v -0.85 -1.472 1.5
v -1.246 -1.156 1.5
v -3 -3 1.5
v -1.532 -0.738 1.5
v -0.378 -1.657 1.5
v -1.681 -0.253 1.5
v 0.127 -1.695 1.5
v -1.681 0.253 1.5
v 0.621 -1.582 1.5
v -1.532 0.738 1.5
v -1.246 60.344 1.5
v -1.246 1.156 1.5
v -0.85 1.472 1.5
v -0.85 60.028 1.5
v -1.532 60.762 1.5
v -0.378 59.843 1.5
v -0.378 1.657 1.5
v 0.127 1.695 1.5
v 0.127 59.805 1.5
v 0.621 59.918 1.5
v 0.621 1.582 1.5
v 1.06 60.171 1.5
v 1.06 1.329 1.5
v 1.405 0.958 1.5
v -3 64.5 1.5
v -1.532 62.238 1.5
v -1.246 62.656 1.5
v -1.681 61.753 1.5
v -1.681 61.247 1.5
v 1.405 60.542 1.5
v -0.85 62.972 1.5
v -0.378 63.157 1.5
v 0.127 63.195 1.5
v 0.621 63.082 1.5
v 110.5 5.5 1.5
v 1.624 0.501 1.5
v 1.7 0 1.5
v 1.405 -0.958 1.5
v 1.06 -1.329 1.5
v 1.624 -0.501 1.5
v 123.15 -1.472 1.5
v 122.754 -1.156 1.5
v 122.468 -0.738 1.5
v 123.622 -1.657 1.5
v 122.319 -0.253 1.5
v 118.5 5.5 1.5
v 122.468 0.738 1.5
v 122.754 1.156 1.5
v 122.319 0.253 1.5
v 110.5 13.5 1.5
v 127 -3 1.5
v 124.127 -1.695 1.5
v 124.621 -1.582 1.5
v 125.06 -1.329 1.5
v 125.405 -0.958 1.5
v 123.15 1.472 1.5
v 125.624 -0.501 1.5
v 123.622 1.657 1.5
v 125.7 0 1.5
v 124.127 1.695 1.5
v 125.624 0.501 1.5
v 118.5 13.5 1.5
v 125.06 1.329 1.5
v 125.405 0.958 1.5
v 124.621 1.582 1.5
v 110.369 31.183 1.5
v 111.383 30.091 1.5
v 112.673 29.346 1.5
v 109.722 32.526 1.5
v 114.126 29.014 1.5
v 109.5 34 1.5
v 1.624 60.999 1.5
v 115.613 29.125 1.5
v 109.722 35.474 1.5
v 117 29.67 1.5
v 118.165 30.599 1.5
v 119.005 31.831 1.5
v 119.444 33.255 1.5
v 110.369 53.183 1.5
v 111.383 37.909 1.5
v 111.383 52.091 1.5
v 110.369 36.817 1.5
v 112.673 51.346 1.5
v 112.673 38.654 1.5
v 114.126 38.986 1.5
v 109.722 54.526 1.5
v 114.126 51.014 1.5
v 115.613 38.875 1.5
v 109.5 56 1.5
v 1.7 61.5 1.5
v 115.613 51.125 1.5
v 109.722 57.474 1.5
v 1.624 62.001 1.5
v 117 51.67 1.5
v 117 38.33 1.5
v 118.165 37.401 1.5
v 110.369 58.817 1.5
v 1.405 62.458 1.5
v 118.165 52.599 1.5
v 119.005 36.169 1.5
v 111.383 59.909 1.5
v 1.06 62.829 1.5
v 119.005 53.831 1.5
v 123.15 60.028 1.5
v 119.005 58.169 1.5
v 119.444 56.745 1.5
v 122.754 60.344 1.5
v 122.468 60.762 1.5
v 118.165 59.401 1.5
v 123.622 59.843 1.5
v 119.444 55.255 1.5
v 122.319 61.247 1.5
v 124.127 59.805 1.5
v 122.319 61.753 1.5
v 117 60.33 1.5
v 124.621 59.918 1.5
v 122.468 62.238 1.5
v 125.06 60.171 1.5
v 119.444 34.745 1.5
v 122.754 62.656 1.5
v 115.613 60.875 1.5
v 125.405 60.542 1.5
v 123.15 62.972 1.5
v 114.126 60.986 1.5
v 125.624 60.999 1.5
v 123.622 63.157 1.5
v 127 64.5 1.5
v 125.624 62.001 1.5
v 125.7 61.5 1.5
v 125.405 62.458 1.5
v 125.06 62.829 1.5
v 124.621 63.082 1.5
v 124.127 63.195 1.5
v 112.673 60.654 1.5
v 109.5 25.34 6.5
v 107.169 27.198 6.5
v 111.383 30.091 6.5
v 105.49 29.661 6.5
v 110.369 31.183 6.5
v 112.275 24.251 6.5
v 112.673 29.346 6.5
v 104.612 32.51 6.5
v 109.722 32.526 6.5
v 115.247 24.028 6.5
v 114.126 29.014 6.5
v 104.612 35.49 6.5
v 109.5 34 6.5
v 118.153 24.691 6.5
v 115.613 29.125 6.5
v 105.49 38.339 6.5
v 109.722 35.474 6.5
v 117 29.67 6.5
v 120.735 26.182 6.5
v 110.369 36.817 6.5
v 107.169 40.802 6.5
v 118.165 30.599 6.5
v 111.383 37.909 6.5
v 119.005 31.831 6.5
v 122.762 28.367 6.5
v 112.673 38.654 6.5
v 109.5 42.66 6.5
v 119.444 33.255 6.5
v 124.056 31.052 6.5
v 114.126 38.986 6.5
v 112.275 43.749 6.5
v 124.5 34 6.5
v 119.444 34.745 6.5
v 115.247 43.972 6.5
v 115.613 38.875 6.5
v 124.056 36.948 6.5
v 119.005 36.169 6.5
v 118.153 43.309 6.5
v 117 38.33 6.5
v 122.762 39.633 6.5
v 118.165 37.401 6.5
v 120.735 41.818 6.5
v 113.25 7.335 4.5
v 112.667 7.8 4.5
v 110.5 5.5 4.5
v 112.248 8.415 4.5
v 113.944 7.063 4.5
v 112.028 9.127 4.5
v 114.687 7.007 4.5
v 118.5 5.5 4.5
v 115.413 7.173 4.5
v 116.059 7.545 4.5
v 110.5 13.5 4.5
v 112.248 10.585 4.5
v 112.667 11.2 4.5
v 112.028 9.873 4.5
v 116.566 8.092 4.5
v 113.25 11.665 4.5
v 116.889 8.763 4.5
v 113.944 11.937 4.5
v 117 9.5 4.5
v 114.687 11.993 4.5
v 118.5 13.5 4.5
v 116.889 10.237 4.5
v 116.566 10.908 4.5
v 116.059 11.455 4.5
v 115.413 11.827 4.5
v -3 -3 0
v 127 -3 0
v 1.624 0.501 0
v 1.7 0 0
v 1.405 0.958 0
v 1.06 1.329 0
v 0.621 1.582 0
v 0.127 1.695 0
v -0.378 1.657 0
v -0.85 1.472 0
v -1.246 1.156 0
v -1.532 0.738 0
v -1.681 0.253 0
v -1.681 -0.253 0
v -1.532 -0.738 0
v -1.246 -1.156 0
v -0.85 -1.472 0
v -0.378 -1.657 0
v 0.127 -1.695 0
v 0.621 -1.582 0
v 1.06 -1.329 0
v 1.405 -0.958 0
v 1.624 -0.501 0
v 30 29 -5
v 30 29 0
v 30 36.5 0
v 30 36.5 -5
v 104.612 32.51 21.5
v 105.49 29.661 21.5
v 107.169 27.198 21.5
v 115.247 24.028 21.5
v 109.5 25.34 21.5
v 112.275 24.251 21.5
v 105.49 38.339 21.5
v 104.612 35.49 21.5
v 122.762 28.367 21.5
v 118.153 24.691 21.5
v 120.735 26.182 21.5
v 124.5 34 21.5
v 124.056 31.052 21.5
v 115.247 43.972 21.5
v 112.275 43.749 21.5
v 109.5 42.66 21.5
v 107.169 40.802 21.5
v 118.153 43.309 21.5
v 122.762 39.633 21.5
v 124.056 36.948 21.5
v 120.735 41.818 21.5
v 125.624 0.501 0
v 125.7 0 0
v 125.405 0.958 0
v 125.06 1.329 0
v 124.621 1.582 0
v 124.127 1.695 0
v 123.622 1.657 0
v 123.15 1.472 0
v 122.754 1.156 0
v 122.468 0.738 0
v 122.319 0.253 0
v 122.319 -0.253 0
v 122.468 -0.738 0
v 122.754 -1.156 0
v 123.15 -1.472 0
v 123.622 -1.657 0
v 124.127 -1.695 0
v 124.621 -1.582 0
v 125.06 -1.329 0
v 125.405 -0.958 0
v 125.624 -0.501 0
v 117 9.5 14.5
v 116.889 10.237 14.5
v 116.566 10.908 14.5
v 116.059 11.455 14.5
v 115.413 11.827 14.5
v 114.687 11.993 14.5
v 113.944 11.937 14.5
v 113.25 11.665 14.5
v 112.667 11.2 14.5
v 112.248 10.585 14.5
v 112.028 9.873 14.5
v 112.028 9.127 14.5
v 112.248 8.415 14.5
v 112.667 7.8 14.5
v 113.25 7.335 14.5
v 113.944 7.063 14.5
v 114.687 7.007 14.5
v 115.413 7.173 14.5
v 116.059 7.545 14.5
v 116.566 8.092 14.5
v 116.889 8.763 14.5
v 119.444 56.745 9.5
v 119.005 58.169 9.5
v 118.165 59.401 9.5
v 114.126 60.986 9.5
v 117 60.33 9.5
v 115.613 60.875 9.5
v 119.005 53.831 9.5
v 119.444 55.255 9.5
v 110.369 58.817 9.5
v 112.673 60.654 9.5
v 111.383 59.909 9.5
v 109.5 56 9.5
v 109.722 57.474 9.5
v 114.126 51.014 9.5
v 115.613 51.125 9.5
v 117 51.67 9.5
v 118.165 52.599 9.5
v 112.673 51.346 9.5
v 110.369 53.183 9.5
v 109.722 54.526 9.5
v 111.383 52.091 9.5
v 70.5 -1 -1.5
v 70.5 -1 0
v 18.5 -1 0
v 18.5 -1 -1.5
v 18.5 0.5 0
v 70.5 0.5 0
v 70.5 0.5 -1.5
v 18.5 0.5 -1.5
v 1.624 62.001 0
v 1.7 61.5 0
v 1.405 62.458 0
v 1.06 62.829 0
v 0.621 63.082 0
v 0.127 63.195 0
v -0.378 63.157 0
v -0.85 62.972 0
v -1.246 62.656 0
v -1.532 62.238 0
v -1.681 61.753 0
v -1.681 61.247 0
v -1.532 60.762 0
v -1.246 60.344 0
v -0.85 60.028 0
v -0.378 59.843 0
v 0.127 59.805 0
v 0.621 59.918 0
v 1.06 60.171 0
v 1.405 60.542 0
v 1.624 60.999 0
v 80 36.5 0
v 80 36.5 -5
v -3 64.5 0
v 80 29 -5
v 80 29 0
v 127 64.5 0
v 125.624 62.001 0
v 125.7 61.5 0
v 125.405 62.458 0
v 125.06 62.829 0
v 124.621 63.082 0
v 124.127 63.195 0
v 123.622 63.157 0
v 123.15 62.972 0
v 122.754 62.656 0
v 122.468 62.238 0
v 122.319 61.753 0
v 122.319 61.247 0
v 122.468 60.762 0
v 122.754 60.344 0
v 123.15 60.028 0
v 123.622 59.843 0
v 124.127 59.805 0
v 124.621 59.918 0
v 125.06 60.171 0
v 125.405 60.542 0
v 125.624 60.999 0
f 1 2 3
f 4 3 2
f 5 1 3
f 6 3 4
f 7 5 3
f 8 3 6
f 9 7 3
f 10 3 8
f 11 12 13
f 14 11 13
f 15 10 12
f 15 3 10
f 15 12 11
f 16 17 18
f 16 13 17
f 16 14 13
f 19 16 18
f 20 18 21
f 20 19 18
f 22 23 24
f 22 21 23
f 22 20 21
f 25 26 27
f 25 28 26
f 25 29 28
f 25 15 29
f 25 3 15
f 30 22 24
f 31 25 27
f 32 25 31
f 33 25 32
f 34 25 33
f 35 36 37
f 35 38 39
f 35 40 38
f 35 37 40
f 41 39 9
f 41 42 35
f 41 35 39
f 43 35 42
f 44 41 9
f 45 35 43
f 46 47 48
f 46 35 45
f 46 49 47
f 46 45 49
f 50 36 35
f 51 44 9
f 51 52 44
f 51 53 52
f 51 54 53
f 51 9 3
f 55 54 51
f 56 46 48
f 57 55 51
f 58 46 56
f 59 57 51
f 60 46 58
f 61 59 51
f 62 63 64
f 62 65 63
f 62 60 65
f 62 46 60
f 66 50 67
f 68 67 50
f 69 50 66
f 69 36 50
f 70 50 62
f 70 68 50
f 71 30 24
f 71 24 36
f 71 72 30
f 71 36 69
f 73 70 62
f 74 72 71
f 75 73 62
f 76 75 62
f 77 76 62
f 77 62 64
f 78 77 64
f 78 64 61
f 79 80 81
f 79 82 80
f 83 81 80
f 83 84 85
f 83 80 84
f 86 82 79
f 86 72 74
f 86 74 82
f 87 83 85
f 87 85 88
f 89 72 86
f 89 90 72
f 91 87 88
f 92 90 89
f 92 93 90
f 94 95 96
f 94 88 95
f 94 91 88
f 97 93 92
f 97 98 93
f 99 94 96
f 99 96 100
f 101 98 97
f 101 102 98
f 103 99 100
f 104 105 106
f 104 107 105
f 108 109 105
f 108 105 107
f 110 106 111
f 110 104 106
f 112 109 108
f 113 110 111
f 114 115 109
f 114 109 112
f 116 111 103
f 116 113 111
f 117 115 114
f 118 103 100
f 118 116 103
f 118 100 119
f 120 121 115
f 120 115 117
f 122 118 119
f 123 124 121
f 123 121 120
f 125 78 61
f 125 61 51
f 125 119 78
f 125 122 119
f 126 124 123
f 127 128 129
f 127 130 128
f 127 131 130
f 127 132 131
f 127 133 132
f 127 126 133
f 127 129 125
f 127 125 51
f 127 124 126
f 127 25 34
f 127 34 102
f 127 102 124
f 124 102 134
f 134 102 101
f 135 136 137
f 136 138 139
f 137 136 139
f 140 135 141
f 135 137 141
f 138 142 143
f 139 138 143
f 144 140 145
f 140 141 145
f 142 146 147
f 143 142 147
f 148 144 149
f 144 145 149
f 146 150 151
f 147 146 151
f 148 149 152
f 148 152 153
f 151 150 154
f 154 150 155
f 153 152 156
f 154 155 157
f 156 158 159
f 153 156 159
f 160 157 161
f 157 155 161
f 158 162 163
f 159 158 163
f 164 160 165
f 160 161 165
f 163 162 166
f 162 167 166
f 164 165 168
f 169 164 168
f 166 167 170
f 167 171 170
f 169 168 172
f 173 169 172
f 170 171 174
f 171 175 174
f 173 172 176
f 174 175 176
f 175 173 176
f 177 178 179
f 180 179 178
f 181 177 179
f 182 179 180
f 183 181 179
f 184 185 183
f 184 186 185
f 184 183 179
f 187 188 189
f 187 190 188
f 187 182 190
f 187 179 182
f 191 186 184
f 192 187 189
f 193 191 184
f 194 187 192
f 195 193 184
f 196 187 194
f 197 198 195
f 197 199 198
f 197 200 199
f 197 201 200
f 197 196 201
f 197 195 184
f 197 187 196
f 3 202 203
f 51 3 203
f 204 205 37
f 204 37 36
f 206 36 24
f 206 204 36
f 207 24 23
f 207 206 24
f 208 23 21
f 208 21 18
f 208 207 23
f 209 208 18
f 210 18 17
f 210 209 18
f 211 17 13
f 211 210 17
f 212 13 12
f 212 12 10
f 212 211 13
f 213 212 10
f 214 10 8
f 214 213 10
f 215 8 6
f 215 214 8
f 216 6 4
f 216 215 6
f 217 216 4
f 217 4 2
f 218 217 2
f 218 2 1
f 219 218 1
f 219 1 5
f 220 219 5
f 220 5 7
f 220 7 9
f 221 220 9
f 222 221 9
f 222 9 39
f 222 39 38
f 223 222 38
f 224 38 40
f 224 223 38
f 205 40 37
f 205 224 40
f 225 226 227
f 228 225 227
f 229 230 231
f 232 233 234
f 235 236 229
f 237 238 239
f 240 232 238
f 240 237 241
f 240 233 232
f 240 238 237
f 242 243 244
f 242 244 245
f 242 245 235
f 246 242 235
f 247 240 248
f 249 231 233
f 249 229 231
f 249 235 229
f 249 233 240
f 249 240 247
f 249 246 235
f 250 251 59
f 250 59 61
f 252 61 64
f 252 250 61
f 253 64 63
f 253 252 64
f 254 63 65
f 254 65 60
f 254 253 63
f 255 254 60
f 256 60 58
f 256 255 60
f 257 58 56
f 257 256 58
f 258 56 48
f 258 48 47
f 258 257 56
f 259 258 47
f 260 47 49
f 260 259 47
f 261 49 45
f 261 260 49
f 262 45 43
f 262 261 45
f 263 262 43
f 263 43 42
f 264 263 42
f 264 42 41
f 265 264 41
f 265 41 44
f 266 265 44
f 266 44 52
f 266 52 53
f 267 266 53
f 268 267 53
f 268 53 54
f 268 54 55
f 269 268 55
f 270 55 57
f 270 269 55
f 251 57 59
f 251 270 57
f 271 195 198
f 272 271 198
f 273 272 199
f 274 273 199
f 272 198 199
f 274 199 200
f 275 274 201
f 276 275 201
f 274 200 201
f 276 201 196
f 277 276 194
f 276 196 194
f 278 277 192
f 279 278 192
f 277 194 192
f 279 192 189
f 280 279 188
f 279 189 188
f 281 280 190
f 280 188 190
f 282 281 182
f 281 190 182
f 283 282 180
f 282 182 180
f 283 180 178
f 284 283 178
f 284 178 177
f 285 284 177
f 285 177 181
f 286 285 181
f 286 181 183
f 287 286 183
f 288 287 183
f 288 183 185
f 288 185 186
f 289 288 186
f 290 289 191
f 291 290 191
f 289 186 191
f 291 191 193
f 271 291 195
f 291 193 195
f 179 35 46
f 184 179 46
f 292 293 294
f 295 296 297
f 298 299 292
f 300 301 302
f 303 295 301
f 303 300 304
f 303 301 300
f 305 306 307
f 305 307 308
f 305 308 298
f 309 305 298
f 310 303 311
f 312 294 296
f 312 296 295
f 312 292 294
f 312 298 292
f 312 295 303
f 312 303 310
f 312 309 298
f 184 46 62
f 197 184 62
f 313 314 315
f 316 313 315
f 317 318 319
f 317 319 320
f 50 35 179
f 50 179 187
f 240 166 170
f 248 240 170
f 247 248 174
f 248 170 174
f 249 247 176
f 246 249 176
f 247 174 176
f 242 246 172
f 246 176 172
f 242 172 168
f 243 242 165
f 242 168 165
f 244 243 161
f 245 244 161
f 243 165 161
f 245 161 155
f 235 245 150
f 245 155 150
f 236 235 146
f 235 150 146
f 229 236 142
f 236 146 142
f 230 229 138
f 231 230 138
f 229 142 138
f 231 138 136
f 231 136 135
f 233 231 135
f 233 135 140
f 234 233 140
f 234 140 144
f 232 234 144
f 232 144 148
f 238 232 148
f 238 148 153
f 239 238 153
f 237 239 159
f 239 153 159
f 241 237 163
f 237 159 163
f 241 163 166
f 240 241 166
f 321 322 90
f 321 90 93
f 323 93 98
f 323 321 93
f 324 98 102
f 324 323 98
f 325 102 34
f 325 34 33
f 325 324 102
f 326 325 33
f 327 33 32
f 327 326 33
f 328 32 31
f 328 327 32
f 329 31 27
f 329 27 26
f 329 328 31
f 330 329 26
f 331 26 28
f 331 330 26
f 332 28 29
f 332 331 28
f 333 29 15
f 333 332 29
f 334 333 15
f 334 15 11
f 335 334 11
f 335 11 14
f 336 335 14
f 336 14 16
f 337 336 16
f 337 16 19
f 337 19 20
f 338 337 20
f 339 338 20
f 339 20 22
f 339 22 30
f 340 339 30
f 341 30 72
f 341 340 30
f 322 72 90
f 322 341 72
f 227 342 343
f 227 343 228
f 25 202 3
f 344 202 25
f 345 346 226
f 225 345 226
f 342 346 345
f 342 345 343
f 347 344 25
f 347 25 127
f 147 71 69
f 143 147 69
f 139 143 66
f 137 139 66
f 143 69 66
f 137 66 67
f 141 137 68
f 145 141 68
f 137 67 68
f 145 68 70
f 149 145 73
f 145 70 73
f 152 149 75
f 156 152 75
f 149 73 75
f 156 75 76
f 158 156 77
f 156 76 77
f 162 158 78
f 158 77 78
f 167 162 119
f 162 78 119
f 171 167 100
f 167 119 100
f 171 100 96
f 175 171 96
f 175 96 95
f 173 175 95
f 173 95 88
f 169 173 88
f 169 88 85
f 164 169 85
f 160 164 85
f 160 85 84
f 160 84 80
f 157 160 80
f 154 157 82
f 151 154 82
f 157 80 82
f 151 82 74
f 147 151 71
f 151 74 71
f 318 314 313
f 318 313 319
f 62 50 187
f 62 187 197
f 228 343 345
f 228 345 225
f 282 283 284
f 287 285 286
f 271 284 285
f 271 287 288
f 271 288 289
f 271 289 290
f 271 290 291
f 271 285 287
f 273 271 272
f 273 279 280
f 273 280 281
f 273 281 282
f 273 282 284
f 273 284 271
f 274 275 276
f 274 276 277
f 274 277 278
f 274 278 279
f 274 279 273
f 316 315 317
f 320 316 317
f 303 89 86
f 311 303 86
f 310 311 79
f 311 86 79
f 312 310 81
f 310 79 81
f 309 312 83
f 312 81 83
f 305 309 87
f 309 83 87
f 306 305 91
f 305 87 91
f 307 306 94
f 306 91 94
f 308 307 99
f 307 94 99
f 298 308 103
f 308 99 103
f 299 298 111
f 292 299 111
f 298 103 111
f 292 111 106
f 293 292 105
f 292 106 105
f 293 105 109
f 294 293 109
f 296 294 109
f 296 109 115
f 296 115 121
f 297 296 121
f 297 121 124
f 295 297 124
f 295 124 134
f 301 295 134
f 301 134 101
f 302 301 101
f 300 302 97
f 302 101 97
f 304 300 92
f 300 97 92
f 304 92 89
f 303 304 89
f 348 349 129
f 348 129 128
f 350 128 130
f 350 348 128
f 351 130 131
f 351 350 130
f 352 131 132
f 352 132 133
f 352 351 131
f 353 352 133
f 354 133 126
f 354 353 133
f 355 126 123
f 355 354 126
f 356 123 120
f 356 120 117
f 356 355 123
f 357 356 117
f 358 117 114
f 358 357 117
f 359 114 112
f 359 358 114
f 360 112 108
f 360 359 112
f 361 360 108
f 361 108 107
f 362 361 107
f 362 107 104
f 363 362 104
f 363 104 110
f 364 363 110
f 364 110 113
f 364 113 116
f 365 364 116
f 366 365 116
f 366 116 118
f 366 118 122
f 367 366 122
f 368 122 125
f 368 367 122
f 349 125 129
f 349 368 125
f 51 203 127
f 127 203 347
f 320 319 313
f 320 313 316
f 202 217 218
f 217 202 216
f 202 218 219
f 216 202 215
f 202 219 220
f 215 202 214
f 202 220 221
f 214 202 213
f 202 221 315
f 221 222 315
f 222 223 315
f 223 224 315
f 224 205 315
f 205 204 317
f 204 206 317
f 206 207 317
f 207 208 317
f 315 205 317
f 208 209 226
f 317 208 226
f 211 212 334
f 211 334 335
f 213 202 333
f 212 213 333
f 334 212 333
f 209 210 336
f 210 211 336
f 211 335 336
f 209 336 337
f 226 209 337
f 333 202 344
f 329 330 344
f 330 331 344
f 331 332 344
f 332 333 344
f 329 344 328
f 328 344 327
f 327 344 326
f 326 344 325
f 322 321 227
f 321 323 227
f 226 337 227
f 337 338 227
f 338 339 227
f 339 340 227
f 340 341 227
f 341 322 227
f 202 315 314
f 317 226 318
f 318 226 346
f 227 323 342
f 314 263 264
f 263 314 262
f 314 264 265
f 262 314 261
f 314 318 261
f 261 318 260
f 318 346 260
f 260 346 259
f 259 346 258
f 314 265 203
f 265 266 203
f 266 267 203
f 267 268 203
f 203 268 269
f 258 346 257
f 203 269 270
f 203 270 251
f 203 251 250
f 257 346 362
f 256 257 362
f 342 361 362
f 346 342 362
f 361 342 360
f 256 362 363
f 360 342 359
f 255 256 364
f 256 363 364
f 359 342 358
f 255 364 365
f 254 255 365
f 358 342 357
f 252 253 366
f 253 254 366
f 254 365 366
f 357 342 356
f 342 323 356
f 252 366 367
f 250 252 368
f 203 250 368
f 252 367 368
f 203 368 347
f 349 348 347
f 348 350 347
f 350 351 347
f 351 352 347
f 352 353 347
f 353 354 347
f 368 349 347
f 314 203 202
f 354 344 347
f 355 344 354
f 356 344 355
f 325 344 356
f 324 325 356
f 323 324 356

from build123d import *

# Parameters (mm, degrees)
SKETCH1_W           = 130
SKETCH1_H           = 67.5
SKETCH1_R           = 1.7
BOSS_EXTRUDE1_DEPTH = 1.5
SKETCH2_R           = 5
BOSS_EXTRUDE2_DEPTH = 8
SKETCH3_R           = 5
BOSS_EXTRUDE3_DEPTH = 5
SKETCH4_R           = 10
BOSS_EXTRUDE4_DEPTH = 15
SKETCH5_W           = 8
SKETCH5_H           = 8
BOSS_EXTRUDE5_DEPTH = 3
SKETCH6_R           = 2.5
BOSS_EXTRUDE6_DEPTH = 10
SKETCH7_W           = 50
SKETCH7_H           = 7.5
BOSS_EXTRUDE7_DEPTH = 5
SKETCH8_W           = 52
SKETCH8_H           = 1.5
BOSS_EXTRUDE8_DEPTH = 1.5


with BuildPart() as part:
    # Sketch1 → Boss-Extrude1 (new body)
    with BuildSketch(Plane.XY):
        with Locations((62, 30.75)):
            Rectangle(SKETCH1_W, SKETCH1_H)
        Circle(SKETCH1_R, mode=Mode.SUBTRACT)
        with Locations((0, 61.5)):
            Circle(SKETCH1_R, mode=Mode.SUBTRACT)
        with Locations((124, 61.5)):
            Circle(SKETCH1_R, mode=Mode.SUBTRACT)
        with Locations((124, 0)):
            Circle(SKETCH1_R, mode=Mode.SUBTRACT)
    extrude(amount=BOSS_EXTRUDE1_DEPTH)

    # Sketch2 → Boss-Extrude2 (add)
    with BuildSketch(Plane.XY.offset(1.5)):
        with Locations(Location((114.5, 56, 0), (0, 0, 180))):
            Circle(SKETCH2_R)
    extrude(amount=BOSS_EXTRUDE2_DEPTH)

    # Sketch3 → Boss-Extrude3 (add)
    with BuildSketch(Plane.XY.offset(1.5)):
        with Locations(Location((114.5, 34, 0), (0, 0, 180))):
            Circle(SKETCH3_R)
    extrude(amount=BOSS_EXTRUDE3_DEPTH)

    # Sketch4 → Boss-Extrude4 (add)
    with BuildSketch(Plane.XY.offset(6.5)):
        with Locations((114.5, 34)):
            Circle(SKETCH4_R)
    extrude(amount=BOSS_EXTRUDE4_DEPTH)

    # Sketch5 → Boss-Extrude5 (add)
    with BuildSketch(Plane.XY.offset(1.5)):
        with Locations((114.5, 9.5)):
            Rectangle(SKETCH5_W, SKETCH5_H)
    extrude(amount=BOSS_EXTRUDE5_DEPTH)

    # Sketch6 → Boss-Extrude6 (add)
    with BuildSketch(Plane.XY.offset(4.5)):
        with Locations((114.5, 9.5)):
            Circle(SKETCH6_R)
    extrude(amount=BOSS_EXTRUDE6_DEPTH)

    # Sketch7 → Boss-Extrude7 (add)
    with BuildSketch(Plane(origin=(0, 0, 0), x_dir=(-1, 0, 0), z_dir=(0, 0, -1))):
        with Locations((-55, 32.75)):
            Rectangle(SKETCH7_W, SKETCH7_H)
    extrude(amount=BOSS_EXTRUDE7_DEPTH)

    # Sketch8 → Boss-Extrude8 (add)
    with BuildSketch(Plane(origin=(0, 0, 0), x_dir=(-1, 0, 0), z_dir=(0, 0, -1))):
        with Locations((-44.5, -0.25)):
            Rectangle(SKETCH8_W, SKETCH8_H)
    extrude(amount=BOSS_EXTRUDE8_DEPTH)


solid = part.part
